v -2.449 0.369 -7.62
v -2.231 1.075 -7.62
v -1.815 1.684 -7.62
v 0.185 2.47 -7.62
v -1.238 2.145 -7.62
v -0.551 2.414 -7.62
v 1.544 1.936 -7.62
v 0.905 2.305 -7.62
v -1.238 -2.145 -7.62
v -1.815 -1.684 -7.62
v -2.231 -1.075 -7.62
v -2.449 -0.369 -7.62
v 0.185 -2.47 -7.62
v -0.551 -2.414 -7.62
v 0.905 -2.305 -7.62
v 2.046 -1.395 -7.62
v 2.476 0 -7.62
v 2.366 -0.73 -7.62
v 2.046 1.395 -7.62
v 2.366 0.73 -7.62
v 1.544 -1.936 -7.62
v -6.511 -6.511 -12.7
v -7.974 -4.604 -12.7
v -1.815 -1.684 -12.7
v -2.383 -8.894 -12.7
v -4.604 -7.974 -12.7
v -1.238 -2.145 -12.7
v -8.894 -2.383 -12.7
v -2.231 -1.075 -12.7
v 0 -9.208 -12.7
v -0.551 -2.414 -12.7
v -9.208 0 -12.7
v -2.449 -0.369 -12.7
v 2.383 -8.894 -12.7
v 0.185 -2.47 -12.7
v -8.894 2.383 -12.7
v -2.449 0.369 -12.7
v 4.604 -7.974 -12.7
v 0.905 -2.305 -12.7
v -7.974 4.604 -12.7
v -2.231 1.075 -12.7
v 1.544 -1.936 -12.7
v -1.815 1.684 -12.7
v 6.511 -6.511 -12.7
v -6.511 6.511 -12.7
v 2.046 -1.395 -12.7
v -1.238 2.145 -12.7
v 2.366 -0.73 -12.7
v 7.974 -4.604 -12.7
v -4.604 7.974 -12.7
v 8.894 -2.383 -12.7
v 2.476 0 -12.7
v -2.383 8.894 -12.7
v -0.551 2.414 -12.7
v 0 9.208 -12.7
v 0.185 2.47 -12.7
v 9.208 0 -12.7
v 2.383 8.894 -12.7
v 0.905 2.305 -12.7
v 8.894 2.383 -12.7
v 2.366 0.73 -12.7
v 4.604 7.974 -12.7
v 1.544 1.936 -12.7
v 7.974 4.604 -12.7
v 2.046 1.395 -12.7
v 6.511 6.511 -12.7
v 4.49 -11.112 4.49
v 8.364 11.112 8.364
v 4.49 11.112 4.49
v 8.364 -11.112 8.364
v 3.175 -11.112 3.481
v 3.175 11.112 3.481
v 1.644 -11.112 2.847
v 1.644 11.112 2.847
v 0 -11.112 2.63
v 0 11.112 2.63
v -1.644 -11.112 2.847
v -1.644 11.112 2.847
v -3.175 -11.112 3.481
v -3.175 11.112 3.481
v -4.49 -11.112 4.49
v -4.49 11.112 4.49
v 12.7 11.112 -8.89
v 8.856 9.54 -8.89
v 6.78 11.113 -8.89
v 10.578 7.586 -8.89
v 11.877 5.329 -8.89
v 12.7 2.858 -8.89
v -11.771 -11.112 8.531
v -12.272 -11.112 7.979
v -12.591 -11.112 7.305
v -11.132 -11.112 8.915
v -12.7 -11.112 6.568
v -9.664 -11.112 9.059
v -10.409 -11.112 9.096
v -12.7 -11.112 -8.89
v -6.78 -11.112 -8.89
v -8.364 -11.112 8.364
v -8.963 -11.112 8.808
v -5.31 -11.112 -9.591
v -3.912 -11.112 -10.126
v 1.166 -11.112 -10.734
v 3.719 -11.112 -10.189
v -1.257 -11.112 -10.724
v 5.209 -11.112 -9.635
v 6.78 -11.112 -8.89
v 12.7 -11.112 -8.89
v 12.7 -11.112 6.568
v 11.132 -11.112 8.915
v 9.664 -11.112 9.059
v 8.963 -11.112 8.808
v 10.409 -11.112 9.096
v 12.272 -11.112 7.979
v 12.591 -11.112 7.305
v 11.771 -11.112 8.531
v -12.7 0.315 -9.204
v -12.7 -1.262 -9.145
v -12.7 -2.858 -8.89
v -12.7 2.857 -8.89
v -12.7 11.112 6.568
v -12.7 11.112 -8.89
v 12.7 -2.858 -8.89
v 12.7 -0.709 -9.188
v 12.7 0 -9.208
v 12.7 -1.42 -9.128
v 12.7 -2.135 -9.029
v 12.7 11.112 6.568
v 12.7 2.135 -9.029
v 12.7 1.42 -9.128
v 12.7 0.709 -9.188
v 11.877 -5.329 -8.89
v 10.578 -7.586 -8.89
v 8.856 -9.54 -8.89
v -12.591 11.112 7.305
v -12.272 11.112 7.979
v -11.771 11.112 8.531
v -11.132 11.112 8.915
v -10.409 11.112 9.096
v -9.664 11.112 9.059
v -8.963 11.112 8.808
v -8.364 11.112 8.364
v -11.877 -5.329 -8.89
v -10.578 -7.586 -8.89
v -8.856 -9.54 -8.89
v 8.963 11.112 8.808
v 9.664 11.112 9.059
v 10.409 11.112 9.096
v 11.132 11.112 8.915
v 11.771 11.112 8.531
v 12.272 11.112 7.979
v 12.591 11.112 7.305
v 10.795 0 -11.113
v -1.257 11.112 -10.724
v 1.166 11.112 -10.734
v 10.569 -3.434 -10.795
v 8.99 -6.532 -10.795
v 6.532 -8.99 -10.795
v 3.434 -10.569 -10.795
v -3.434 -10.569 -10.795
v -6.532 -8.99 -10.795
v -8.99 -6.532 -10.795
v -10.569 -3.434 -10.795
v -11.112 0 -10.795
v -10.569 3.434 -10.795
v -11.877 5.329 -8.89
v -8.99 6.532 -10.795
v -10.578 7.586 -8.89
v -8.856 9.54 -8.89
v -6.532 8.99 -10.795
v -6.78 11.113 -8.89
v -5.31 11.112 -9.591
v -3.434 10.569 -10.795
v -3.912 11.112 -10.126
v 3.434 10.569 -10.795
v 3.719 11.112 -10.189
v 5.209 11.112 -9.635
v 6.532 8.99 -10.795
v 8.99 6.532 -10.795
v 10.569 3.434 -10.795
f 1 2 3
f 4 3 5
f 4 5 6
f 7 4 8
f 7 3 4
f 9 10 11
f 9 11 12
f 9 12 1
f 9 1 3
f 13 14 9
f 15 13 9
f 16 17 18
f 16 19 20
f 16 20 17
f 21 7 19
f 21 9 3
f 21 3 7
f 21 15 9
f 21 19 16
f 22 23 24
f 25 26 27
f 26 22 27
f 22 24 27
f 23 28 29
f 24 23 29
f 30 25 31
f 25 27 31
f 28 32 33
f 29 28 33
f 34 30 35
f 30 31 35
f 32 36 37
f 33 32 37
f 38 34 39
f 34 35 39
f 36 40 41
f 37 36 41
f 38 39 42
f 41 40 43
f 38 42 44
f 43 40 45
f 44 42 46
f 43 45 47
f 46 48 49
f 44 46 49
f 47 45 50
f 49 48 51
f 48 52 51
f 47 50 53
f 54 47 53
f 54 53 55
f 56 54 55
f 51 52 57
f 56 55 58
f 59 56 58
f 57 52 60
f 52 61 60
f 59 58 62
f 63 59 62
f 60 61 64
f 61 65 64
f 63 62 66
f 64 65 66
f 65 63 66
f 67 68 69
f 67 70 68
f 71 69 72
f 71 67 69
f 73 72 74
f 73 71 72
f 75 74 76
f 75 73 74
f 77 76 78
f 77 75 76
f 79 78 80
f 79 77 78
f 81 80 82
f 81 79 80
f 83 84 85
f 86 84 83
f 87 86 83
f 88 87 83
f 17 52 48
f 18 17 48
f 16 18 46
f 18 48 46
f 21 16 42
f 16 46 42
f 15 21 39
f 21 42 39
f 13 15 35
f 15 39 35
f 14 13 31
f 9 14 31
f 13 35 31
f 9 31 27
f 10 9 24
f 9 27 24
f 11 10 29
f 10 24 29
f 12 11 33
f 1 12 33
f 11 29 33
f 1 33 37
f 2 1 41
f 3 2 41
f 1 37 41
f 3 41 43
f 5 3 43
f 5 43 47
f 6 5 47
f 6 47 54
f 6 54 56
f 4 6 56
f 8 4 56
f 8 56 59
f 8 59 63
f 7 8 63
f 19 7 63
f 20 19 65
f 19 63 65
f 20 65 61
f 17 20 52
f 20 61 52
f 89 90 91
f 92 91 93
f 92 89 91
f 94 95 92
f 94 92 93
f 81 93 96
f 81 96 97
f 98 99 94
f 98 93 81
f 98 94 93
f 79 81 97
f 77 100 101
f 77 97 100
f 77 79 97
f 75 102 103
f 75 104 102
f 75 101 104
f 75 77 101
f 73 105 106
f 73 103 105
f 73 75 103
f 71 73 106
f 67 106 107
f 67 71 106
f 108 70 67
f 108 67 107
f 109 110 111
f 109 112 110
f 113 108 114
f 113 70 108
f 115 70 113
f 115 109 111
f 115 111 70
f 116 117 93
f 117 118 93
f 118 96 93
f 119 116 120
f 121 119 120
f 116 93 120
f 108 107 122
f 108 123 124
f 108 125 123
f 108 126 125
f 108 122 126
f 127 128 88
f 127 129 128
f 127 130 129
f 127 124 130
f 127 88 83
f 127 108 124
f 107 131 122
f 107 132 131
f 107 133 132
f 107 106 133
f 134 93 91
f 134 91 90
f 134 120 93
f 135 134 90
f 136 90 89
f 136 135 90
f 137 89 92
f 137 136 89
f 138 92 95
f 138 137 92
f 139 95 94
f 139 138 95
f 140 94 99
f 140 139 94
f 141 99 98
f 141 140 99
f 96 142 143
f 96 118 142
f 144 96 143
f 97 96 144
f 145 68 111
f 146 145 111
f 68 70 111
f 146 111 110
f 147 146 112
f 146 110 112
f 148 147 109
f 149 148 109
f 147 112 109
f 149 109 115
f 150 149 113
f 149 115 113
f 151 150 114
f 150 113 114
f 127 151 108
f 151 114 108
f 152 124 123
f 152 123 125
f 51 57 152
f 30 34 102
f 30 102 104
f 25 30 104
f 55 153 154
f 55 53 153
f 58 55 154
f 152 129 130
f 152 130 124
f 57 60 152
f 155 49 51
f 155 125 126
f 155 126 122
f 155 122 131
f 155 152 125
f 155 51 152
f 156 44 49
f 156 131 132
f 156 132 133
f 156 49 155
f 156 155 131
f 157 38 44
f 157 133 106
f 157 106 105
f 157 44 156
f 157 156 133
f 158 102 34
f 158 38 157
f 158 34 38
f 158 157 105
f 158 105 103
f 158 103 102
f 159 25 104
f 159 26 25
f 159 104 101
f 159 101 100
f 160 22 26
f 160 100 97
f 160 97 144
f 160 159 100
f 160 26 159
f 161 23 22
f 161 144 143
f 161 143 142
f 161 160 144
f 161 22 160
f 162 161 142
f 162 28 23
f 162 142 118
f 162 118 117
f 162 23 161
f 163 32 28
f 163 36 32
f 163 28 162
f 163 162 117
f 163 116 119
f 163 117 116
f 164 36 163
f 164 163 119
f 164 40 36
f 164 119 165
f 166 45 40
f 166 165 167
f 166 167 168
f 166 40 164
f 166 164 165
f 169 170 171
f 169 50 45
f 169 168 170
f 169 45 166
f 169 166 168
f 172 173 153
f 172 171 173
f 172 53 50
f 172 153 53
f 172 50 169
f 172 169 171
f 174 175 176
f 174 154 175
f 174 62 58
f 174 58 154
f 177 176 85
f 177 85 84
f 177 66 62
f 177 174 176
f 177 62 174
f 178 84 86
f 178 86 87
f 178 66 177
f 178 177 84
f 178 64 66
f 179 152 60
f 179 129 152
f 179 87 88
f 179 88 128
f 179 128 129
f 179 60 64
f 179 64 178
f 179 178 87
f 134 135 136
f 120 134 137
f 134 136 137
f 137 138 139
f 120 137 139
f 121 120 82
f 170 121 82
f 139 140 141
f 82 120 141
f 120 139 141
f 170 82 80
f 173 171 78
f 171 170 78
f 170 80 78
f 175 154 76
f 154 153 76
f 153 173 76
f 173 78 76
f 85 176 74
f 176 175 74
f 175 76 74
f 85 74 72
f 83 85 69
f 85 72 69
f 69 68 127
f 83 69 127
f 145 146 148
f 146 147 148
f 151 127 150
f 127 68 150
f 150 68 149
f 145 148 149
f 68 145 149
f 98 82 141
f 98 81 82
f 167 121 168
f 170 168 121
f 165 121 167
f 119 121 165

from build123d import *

# Parameters (mm, degrees)
F1_DEPTH = 11.1125
F2_R     = 2.54
F3_R     = 2.4765
F4_DEPTH = 5.08
F5_W     = 25.4
F5_H     = 22.225
F5_R     = 7.9375
F6_DEPTH = 3.81


# Not quite as in the source:
# - a fillet or chamfer that OpenCascade refuses, or shapes differently, is made with other operations: its cross-section is extruded or revolved along the edge and cut away or added


with BuildPart() as f1:
    # F0 (on Front) → F1 (new body, symmetric)
    with BuildSketch(Plane.XZ):
        Polygon((-4.490128064, 4.490128064), (-12.7, 12.7), (-12.7, -12.7), (12.7, -12.7), (12.7, 12.7), (4.4901280734, 4.4901280734), (0, 0), align=None)
        with BuildLine():
            ThreePointArc((4.4901280734, 4.4901280734), (6.6e-09, 2.6302561211), (-4.490128064, 4.490128064))
            Line((-4.490128064, 4.490128064), (0, 0))
            Line((0, 0), (4.4901280734, 4.4901280734))
        make_face()
    extrude(amount=F1_DEPTH, both=True)

    # F2
    f2_edges = [f1.edges().sort_by_distance(p)[0] for p in [
        (12.7, 0, 12.7),
        (-12.7, 0, 12.7),
    ]]
    fillet(f2_edges, radius=F2_R)

    # F3 (on face) → F4 (cut)
    with BuildSketch(Plane(origin=(0, 0, -12.7), x_dir=(1, 0, 0), z_dir=(0, 0, -1))):
        Circle(F3_R)
    extrude(amount=-F4_DEPTH, mode=Mode.SUBTRACT)

    # F5 (on face) → F6 (cut)
    with BuildSketch(Plane(origin=(0, 0, -12.7), x_dir=(1, 0, 0), z_dir=(0, 0, -1))):
        Rectangle(F5_W, F5_H)
        Circle(F5_R, mode=Mode.SUBTRACT)
    extrude(amount=-F6_DEPTH, mode=Mode.SUBTRACT)

    # F7: chamfer of 5.08 on 1 edges, made by hand


with BuildPart() as f7_tool2:
    # F7_s3 → F7_t4 (revolve)
    with BuildSketch(Plane.XZ):
        Polygon((13.0175, -8.89), (7.9375, -13.97), (7.9375, -8.89), align=None)
    revolve(axis=Axis((0, 0, -8.89), (0, 0, -1)))

    split(bisect_by=Plane.XZ.offset(-11.1125), keep=Keep.TOP)

    split(bisect_by=Plane.XZ.offset(11.1125), keep=Keep.BOTTOM)

    split(bisect_by=Plane.YZ.offset(12.7), keep=Keep.BOTTOM)

    split(bisect_by=Plane.YZ.offset(-12.7), keep=Keep.TOP)

    split(bisect_by=Plane.XY.offset(-12.7), keep=Keep.TOP)


with BuildPart() as f1_1:
    add(f1.part)

    # F7_t1: union F7_tool2
    add(f7_tool2.part)


solid = f1_1.part
